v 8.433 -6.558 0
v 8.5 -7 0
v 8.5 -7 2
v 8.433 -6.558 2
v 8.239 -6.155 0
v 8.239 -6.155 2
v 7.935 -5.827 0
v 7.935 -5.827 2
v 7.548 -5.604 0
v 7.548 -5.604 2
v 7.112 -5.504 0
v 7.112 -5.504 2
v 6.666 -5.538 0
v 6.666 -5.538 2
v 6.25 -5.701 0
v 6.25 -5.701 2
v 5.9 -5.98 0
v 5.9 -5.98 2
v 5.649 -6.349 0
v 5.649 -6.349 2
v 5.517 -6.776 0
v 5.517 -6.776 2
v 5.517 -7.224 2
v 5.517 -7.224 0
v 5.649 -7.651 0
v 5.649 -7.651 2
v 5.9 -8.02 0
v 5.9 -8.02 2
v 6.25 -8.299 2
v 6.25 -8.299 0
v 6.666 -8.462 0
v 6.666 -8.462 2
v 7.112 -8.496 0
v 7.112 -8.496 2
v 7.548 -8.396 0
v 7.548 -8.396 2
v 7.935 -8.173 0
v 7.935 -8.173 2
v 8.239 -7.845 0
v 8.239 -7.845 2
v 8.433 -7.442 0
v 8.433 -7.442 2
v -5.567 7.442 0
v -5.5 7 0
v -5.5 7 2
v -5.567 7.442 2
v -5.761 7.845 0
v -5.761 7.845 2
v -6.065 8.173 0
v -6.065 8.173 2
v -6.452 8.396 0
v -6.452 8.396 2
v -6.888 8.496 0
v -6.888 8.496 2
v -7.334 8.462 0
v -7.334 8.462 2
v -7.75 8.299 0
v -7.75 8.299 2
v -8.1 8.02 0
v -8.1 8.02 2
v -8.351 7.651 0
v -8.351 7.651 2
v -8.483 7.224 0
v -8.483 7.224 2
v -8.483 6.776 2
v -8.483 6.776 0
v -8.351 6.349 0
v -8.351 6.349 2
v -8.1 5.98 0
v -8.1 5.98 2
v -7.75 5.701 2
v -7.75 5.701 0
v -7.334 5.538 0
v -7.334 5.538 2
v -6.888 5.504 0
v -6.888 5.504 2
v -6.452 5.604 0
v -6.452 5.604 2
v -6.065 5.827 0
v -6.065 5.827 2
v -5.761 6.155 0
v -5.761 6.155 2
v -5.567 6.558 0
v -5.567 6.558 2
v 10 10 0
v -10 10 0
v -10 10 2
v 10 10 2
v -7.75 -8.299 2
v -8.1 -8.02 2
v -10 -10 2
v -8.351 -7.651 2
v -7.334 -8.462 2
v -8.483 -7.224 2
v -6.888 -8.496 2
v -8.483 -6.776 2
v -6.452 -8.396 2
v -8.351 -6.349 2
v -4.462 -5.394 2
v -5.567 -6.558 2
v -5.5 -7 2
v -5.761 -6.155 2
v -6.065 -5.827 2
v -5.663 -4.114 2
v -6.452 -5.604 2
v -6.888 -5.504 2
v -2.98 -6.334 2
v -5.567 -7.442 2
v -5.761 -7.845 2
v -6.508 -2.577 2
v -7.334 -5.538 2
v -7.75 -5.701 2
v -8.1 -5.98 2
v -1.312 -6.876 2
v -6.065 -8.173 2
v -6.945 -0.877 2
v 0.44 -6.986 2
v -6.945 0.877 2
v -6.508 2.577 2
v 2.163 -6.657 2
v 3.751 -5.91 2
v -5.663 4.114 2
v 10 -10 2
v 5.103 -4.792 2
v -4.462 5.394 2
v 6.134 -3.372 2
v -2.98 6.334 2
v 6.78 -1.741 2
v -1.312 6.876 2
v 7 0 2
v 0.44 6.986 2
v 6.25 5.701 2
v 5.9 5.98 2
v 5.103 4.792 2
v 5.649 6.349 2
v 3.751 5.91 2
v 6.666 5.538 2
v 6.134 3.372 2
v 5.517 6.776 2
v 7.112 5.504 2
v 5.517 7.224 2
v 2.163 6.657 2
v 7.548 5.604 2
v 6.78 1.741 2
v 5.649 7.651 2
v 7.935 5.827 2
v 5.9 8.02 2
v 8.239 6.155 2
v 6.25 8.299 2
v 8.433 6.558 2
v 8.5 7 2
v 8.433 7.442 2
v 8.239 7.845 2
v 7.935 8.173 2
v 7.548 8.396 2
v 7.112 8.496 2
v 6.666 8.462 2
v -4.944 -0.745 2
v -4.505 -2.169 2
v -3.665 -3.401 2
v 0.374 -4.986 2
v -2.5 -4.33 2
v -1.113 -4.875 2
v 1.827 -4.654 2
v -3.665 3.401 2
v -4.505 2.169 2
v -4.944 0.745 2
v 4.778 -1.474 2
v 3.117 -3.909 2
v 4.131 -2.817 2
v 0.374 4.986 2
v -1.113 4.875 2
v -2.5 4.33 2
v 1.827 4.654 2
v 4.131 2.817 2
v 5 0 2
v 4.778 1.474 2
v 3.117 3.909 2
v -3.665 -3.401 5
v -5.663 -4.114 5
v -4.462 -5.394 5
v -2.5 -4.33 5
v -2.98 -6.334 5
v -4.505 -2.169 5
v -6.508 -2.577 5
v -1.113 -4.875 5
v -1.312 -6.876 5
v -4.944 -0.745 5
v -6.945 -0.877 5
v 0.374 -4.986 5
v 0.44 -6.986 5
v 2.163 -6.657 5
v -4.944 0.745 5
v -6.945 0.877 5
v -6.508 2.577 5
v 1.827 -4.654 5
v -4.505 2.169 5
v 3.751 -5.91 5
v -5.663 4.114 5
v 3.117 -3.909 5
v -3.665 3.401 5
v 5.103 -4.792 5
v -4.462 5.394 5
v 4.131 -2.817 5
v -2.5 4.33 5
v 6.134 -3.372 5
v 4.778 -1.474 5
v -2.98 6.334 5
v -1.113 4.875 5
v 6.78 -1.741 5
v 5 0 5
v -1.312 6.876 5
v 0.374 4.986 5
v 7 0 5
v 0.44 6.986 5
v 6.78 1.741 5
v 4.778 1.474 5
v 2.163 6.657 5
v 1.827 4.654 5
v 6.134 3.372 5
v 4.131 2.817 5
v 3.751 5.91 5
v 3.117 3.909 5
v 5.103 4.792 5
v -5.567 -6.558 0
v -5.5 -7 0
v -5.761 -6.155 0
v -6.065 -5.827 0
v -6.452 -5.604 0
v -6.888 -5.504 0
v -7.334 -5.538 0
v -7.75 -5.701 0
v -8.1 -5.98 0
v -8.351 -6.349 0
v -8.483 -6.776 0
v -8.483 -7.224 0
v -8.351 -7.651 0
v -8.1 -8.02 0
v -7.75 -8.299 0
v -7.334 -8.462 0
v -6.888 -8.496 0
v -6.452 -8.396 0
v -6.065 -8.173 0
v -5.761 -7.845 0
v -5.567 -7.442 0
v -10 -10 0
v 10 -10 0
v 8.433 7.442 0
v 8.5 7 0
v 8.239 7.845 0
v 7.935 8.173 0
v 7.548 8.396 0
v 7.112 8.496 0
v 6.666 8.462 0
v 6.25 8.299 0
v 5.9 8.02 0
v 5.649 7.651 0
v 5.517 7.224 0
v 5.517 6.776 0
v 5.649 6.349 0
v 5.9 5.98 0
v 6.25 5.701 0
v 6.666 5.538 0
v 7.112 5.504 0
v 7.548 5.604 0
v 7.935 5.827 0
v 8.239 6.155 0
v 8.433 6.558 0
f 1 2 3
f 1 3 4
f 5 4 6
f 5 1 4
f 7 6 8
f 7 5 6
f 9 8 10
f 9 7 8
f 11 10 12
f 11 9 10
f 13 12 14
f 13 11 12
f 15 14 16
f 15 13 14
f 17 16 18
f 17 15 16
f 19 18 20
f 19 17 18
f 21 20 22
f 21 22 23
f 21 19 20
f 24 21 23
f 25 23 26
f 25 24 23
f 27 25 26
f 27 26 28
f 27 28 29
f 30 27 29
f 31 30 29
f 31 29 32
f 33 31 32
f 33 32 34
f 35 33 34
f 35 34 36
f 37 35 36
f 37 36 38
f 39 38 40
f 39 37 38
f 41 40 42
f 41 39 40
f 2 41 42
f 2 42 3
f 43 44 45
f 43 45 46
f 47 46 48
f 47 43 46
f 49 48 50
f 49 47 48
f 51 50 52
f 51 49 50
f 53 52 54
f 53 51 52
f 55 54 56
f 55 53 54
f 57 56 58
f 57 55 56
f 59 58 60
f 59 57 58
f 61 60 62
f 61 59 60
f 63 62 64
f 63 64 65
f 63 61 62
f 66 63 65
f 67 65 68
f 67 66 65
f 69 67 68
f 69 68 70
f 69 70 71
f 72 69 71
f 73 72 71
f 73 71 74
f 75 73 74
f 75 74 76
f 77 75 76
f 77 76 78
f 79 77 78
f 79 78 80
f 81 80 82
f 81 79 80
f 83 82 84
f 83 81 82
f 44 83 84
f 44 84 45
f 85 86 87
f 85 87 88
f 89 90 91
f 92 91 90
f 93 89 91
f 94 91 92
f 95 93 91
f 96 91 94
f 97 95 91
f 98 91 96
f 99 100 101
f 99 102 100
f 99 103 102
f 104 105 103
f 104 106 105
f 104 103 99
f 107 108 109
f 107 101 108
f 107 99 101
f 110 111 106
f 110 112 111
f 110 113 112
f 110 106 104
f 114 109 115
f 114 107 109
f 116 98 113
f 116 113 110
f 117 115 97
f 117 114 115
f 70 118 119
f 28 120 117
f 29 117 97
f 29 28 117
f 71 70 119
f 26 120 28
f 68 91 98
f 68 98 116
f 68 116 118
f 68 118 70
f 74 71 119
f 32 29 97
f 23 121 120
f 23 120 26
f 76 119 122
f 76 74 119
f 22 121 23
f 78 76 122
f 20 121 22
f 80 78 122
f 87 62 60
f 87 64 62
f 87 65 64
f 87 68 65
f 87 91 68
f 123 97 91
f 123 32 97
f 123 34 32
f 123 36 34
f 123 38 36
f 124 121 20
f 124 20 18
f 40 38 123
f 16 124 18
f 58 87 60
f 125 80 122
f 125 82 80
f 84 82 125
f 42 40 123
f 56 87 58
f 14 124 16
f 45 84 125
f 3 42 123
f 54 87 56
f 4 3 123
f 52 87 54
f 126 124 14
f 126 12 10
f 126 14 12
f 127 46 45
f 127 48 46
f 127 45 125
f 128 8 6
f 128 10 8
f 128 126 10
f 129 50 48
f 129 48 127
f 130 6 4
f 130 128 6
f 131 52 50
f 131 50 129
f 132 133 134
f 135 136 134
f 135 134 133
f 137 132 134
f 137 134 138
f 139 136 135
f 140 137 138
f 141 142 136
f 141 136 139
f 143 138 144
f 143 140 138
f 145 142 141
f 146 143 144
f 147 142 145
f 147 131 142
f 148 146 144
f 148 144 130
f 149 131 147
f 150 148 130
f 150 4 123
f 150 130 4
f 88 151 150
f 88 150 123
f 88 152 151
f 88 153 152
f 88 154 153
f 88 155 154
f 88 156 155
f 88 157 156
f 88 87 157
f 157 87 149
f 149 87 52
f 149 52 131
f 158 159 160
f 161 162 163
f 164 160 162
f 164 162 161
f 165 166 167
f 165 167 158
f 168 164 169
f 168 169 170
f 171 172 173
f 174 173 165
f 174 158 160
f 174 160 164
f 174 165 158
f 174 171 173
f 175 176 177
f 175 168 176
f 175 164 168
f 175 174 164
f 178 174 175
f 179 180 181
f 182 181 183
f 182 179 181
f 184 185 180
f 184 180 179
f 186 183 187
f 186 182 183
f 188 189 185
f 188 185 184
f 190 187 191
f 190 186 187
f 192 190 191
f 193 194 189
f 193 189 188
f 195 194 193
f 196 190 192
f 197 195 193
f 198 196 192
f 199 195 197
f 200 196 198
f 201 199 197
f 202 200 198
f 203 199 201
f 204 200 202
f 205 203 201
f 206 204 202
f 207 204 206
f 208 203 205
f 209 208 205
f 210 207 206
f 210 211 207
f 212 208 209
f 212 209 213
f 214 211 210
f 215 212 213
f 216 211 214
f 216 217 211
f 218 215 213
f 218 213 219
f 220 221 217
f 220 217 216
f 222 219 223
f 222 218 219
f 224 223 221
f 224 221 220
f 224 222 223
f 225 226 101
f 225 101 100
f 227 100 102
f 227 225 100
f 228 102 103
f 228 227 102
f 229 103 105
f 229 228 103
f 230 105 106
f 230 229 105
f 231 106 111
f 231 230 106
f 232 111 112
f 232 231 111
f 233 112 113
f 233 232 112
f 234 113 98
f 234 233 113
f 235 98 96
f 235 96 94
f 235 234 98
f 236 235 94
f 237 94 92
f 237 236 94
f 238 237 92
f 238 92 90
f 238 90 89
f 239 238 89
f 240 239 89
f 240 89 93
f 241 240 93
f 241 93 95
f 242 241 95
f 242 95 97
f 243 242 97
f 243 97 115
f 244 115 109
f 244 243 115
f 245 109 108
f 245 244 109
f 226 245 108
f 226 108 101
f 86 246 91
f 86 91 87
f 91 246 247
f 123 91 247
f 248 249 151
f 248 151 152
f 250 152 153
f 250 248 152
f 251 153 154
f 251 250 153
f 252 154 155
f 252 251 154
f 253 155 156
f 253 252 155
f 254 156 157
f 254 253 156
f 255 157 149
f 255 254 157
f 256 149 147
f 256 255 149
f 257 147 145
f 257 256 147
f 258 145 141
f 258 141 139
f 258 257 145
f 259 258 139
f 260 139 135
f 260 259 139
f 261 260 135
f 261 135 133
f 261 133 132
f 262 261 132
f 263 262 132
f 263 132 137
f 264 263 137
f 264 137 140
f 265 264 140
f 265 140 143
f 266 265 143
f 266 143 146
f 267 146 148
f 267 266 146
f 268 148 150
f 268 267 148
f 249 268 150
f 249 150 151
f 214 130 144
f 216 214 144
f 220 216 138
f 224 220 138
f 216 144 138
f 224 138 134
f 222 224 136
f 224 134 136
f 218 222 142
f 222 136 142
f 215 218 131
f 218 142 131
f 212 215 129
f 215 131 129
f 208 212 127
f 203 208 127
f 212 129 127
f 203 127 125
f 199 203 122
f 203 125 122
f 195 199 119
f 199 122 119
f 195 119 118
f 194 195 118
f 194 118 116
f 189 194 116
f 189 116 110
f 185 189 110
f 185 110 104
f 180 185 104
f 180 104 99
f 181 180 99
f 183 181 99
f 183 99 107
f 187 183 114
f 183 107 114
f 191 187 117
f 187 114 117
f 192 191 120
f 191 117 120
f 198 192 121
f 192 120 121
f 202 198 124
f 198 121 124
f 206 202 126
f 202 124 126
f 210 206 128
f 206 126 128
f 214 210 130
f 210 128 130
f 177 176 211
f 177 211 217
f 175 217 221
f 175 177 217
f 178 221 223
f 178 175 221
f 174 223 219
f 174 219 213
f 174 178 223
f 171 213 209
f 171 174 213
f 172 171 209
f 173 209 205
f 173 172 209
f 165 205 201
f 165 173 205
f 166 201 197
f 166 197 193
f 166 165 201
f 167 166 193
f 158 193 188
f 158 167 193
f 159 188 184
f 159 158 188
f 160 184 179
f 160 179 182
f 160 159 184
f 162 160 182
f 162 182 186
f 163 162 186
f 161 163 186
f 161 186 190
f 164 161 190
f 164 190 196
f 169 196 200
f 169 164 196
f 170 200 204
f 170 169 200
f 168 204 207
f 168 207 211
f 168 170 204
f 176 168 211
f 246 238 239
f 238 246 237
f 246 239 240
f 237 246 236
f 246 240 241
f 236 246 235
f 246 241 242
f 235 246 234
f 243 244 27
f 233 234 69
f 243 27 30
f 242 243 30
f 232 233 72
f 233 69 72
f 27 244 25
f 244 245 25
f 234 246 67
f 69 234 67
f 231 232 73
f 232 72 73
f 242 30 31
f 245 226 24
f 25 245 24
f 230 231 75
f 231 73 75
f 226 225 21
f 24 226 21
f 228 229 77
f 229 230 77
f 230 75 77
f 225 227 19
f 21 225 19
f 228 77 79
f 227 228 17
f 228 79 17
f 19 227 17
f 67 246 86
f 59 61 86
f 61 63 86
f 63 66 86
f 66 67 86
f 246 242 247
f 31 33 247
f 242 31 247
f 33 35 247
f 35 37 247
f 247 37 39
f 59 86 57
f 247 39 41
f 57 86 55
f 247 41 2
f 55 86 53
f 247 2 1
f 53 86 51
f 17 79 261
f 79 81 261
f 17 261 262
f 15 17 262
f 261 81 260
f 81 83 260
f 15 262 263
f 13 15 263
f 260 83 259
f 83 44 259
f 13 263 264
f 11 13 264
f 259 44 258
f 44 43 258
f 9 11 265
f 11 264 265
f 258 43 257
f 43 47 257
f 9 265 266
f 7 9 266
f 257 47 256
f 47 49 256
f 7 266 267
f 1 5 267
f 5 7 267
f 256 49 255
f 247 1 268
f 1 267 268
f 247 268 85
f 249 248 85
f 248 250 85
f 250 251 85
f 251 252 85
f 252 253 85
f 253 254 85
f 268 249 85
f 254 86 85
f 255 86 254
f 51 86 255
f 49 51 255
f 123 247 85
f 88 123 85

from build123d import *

# Parameters (mm, degrees)
SKETCH_1_W      = 20
SKETCH_1_H      = 20
SKETCH_1_R      = 1.5
EXTRUDE_1_DEPTH = 2
SKETCH_2_R      = 7
SKETCH_2_R_2    = 5
EXTRUDE_2_DEPTH = 3


with BuildPart() as part:
    # 草图1 → 凸台-拉伸1 (new body)
    with BuildSketch(Plane.XY):
        Rectangle(SKETCH_1_W, SKETCH_1_H)
        with Locations((-7, 7)):
            Circle(SKETCH_1_R, mode=Mode.SUBTRACT)
        with Locations((7, 7)):
            Circle(SKETCH_1_R, mode=Mode.SUBTRACT)
        with Locations((7, -7)):
            Circle(SKETCH_1_R, mode=Mode.SUBTRACT)
        with Locations((-7, -7)):
            Circle(SKETCH_1_R, mode=Mode.SUBTRACT)
    extrude(amount=EXTRUDE_1_DEPTH)

    # 草图2 → 凸台-拉伸2 (add)
    with BuildSketch(Plane.XY.offset(2)):
        Circle(SKETCH_2_R)
        Circle(SKETCH_2_R_2, mode=Mode.SUBTRACT)
    extrude(amount=EXTRUDE_2_DEPTH)


solid = part.part
